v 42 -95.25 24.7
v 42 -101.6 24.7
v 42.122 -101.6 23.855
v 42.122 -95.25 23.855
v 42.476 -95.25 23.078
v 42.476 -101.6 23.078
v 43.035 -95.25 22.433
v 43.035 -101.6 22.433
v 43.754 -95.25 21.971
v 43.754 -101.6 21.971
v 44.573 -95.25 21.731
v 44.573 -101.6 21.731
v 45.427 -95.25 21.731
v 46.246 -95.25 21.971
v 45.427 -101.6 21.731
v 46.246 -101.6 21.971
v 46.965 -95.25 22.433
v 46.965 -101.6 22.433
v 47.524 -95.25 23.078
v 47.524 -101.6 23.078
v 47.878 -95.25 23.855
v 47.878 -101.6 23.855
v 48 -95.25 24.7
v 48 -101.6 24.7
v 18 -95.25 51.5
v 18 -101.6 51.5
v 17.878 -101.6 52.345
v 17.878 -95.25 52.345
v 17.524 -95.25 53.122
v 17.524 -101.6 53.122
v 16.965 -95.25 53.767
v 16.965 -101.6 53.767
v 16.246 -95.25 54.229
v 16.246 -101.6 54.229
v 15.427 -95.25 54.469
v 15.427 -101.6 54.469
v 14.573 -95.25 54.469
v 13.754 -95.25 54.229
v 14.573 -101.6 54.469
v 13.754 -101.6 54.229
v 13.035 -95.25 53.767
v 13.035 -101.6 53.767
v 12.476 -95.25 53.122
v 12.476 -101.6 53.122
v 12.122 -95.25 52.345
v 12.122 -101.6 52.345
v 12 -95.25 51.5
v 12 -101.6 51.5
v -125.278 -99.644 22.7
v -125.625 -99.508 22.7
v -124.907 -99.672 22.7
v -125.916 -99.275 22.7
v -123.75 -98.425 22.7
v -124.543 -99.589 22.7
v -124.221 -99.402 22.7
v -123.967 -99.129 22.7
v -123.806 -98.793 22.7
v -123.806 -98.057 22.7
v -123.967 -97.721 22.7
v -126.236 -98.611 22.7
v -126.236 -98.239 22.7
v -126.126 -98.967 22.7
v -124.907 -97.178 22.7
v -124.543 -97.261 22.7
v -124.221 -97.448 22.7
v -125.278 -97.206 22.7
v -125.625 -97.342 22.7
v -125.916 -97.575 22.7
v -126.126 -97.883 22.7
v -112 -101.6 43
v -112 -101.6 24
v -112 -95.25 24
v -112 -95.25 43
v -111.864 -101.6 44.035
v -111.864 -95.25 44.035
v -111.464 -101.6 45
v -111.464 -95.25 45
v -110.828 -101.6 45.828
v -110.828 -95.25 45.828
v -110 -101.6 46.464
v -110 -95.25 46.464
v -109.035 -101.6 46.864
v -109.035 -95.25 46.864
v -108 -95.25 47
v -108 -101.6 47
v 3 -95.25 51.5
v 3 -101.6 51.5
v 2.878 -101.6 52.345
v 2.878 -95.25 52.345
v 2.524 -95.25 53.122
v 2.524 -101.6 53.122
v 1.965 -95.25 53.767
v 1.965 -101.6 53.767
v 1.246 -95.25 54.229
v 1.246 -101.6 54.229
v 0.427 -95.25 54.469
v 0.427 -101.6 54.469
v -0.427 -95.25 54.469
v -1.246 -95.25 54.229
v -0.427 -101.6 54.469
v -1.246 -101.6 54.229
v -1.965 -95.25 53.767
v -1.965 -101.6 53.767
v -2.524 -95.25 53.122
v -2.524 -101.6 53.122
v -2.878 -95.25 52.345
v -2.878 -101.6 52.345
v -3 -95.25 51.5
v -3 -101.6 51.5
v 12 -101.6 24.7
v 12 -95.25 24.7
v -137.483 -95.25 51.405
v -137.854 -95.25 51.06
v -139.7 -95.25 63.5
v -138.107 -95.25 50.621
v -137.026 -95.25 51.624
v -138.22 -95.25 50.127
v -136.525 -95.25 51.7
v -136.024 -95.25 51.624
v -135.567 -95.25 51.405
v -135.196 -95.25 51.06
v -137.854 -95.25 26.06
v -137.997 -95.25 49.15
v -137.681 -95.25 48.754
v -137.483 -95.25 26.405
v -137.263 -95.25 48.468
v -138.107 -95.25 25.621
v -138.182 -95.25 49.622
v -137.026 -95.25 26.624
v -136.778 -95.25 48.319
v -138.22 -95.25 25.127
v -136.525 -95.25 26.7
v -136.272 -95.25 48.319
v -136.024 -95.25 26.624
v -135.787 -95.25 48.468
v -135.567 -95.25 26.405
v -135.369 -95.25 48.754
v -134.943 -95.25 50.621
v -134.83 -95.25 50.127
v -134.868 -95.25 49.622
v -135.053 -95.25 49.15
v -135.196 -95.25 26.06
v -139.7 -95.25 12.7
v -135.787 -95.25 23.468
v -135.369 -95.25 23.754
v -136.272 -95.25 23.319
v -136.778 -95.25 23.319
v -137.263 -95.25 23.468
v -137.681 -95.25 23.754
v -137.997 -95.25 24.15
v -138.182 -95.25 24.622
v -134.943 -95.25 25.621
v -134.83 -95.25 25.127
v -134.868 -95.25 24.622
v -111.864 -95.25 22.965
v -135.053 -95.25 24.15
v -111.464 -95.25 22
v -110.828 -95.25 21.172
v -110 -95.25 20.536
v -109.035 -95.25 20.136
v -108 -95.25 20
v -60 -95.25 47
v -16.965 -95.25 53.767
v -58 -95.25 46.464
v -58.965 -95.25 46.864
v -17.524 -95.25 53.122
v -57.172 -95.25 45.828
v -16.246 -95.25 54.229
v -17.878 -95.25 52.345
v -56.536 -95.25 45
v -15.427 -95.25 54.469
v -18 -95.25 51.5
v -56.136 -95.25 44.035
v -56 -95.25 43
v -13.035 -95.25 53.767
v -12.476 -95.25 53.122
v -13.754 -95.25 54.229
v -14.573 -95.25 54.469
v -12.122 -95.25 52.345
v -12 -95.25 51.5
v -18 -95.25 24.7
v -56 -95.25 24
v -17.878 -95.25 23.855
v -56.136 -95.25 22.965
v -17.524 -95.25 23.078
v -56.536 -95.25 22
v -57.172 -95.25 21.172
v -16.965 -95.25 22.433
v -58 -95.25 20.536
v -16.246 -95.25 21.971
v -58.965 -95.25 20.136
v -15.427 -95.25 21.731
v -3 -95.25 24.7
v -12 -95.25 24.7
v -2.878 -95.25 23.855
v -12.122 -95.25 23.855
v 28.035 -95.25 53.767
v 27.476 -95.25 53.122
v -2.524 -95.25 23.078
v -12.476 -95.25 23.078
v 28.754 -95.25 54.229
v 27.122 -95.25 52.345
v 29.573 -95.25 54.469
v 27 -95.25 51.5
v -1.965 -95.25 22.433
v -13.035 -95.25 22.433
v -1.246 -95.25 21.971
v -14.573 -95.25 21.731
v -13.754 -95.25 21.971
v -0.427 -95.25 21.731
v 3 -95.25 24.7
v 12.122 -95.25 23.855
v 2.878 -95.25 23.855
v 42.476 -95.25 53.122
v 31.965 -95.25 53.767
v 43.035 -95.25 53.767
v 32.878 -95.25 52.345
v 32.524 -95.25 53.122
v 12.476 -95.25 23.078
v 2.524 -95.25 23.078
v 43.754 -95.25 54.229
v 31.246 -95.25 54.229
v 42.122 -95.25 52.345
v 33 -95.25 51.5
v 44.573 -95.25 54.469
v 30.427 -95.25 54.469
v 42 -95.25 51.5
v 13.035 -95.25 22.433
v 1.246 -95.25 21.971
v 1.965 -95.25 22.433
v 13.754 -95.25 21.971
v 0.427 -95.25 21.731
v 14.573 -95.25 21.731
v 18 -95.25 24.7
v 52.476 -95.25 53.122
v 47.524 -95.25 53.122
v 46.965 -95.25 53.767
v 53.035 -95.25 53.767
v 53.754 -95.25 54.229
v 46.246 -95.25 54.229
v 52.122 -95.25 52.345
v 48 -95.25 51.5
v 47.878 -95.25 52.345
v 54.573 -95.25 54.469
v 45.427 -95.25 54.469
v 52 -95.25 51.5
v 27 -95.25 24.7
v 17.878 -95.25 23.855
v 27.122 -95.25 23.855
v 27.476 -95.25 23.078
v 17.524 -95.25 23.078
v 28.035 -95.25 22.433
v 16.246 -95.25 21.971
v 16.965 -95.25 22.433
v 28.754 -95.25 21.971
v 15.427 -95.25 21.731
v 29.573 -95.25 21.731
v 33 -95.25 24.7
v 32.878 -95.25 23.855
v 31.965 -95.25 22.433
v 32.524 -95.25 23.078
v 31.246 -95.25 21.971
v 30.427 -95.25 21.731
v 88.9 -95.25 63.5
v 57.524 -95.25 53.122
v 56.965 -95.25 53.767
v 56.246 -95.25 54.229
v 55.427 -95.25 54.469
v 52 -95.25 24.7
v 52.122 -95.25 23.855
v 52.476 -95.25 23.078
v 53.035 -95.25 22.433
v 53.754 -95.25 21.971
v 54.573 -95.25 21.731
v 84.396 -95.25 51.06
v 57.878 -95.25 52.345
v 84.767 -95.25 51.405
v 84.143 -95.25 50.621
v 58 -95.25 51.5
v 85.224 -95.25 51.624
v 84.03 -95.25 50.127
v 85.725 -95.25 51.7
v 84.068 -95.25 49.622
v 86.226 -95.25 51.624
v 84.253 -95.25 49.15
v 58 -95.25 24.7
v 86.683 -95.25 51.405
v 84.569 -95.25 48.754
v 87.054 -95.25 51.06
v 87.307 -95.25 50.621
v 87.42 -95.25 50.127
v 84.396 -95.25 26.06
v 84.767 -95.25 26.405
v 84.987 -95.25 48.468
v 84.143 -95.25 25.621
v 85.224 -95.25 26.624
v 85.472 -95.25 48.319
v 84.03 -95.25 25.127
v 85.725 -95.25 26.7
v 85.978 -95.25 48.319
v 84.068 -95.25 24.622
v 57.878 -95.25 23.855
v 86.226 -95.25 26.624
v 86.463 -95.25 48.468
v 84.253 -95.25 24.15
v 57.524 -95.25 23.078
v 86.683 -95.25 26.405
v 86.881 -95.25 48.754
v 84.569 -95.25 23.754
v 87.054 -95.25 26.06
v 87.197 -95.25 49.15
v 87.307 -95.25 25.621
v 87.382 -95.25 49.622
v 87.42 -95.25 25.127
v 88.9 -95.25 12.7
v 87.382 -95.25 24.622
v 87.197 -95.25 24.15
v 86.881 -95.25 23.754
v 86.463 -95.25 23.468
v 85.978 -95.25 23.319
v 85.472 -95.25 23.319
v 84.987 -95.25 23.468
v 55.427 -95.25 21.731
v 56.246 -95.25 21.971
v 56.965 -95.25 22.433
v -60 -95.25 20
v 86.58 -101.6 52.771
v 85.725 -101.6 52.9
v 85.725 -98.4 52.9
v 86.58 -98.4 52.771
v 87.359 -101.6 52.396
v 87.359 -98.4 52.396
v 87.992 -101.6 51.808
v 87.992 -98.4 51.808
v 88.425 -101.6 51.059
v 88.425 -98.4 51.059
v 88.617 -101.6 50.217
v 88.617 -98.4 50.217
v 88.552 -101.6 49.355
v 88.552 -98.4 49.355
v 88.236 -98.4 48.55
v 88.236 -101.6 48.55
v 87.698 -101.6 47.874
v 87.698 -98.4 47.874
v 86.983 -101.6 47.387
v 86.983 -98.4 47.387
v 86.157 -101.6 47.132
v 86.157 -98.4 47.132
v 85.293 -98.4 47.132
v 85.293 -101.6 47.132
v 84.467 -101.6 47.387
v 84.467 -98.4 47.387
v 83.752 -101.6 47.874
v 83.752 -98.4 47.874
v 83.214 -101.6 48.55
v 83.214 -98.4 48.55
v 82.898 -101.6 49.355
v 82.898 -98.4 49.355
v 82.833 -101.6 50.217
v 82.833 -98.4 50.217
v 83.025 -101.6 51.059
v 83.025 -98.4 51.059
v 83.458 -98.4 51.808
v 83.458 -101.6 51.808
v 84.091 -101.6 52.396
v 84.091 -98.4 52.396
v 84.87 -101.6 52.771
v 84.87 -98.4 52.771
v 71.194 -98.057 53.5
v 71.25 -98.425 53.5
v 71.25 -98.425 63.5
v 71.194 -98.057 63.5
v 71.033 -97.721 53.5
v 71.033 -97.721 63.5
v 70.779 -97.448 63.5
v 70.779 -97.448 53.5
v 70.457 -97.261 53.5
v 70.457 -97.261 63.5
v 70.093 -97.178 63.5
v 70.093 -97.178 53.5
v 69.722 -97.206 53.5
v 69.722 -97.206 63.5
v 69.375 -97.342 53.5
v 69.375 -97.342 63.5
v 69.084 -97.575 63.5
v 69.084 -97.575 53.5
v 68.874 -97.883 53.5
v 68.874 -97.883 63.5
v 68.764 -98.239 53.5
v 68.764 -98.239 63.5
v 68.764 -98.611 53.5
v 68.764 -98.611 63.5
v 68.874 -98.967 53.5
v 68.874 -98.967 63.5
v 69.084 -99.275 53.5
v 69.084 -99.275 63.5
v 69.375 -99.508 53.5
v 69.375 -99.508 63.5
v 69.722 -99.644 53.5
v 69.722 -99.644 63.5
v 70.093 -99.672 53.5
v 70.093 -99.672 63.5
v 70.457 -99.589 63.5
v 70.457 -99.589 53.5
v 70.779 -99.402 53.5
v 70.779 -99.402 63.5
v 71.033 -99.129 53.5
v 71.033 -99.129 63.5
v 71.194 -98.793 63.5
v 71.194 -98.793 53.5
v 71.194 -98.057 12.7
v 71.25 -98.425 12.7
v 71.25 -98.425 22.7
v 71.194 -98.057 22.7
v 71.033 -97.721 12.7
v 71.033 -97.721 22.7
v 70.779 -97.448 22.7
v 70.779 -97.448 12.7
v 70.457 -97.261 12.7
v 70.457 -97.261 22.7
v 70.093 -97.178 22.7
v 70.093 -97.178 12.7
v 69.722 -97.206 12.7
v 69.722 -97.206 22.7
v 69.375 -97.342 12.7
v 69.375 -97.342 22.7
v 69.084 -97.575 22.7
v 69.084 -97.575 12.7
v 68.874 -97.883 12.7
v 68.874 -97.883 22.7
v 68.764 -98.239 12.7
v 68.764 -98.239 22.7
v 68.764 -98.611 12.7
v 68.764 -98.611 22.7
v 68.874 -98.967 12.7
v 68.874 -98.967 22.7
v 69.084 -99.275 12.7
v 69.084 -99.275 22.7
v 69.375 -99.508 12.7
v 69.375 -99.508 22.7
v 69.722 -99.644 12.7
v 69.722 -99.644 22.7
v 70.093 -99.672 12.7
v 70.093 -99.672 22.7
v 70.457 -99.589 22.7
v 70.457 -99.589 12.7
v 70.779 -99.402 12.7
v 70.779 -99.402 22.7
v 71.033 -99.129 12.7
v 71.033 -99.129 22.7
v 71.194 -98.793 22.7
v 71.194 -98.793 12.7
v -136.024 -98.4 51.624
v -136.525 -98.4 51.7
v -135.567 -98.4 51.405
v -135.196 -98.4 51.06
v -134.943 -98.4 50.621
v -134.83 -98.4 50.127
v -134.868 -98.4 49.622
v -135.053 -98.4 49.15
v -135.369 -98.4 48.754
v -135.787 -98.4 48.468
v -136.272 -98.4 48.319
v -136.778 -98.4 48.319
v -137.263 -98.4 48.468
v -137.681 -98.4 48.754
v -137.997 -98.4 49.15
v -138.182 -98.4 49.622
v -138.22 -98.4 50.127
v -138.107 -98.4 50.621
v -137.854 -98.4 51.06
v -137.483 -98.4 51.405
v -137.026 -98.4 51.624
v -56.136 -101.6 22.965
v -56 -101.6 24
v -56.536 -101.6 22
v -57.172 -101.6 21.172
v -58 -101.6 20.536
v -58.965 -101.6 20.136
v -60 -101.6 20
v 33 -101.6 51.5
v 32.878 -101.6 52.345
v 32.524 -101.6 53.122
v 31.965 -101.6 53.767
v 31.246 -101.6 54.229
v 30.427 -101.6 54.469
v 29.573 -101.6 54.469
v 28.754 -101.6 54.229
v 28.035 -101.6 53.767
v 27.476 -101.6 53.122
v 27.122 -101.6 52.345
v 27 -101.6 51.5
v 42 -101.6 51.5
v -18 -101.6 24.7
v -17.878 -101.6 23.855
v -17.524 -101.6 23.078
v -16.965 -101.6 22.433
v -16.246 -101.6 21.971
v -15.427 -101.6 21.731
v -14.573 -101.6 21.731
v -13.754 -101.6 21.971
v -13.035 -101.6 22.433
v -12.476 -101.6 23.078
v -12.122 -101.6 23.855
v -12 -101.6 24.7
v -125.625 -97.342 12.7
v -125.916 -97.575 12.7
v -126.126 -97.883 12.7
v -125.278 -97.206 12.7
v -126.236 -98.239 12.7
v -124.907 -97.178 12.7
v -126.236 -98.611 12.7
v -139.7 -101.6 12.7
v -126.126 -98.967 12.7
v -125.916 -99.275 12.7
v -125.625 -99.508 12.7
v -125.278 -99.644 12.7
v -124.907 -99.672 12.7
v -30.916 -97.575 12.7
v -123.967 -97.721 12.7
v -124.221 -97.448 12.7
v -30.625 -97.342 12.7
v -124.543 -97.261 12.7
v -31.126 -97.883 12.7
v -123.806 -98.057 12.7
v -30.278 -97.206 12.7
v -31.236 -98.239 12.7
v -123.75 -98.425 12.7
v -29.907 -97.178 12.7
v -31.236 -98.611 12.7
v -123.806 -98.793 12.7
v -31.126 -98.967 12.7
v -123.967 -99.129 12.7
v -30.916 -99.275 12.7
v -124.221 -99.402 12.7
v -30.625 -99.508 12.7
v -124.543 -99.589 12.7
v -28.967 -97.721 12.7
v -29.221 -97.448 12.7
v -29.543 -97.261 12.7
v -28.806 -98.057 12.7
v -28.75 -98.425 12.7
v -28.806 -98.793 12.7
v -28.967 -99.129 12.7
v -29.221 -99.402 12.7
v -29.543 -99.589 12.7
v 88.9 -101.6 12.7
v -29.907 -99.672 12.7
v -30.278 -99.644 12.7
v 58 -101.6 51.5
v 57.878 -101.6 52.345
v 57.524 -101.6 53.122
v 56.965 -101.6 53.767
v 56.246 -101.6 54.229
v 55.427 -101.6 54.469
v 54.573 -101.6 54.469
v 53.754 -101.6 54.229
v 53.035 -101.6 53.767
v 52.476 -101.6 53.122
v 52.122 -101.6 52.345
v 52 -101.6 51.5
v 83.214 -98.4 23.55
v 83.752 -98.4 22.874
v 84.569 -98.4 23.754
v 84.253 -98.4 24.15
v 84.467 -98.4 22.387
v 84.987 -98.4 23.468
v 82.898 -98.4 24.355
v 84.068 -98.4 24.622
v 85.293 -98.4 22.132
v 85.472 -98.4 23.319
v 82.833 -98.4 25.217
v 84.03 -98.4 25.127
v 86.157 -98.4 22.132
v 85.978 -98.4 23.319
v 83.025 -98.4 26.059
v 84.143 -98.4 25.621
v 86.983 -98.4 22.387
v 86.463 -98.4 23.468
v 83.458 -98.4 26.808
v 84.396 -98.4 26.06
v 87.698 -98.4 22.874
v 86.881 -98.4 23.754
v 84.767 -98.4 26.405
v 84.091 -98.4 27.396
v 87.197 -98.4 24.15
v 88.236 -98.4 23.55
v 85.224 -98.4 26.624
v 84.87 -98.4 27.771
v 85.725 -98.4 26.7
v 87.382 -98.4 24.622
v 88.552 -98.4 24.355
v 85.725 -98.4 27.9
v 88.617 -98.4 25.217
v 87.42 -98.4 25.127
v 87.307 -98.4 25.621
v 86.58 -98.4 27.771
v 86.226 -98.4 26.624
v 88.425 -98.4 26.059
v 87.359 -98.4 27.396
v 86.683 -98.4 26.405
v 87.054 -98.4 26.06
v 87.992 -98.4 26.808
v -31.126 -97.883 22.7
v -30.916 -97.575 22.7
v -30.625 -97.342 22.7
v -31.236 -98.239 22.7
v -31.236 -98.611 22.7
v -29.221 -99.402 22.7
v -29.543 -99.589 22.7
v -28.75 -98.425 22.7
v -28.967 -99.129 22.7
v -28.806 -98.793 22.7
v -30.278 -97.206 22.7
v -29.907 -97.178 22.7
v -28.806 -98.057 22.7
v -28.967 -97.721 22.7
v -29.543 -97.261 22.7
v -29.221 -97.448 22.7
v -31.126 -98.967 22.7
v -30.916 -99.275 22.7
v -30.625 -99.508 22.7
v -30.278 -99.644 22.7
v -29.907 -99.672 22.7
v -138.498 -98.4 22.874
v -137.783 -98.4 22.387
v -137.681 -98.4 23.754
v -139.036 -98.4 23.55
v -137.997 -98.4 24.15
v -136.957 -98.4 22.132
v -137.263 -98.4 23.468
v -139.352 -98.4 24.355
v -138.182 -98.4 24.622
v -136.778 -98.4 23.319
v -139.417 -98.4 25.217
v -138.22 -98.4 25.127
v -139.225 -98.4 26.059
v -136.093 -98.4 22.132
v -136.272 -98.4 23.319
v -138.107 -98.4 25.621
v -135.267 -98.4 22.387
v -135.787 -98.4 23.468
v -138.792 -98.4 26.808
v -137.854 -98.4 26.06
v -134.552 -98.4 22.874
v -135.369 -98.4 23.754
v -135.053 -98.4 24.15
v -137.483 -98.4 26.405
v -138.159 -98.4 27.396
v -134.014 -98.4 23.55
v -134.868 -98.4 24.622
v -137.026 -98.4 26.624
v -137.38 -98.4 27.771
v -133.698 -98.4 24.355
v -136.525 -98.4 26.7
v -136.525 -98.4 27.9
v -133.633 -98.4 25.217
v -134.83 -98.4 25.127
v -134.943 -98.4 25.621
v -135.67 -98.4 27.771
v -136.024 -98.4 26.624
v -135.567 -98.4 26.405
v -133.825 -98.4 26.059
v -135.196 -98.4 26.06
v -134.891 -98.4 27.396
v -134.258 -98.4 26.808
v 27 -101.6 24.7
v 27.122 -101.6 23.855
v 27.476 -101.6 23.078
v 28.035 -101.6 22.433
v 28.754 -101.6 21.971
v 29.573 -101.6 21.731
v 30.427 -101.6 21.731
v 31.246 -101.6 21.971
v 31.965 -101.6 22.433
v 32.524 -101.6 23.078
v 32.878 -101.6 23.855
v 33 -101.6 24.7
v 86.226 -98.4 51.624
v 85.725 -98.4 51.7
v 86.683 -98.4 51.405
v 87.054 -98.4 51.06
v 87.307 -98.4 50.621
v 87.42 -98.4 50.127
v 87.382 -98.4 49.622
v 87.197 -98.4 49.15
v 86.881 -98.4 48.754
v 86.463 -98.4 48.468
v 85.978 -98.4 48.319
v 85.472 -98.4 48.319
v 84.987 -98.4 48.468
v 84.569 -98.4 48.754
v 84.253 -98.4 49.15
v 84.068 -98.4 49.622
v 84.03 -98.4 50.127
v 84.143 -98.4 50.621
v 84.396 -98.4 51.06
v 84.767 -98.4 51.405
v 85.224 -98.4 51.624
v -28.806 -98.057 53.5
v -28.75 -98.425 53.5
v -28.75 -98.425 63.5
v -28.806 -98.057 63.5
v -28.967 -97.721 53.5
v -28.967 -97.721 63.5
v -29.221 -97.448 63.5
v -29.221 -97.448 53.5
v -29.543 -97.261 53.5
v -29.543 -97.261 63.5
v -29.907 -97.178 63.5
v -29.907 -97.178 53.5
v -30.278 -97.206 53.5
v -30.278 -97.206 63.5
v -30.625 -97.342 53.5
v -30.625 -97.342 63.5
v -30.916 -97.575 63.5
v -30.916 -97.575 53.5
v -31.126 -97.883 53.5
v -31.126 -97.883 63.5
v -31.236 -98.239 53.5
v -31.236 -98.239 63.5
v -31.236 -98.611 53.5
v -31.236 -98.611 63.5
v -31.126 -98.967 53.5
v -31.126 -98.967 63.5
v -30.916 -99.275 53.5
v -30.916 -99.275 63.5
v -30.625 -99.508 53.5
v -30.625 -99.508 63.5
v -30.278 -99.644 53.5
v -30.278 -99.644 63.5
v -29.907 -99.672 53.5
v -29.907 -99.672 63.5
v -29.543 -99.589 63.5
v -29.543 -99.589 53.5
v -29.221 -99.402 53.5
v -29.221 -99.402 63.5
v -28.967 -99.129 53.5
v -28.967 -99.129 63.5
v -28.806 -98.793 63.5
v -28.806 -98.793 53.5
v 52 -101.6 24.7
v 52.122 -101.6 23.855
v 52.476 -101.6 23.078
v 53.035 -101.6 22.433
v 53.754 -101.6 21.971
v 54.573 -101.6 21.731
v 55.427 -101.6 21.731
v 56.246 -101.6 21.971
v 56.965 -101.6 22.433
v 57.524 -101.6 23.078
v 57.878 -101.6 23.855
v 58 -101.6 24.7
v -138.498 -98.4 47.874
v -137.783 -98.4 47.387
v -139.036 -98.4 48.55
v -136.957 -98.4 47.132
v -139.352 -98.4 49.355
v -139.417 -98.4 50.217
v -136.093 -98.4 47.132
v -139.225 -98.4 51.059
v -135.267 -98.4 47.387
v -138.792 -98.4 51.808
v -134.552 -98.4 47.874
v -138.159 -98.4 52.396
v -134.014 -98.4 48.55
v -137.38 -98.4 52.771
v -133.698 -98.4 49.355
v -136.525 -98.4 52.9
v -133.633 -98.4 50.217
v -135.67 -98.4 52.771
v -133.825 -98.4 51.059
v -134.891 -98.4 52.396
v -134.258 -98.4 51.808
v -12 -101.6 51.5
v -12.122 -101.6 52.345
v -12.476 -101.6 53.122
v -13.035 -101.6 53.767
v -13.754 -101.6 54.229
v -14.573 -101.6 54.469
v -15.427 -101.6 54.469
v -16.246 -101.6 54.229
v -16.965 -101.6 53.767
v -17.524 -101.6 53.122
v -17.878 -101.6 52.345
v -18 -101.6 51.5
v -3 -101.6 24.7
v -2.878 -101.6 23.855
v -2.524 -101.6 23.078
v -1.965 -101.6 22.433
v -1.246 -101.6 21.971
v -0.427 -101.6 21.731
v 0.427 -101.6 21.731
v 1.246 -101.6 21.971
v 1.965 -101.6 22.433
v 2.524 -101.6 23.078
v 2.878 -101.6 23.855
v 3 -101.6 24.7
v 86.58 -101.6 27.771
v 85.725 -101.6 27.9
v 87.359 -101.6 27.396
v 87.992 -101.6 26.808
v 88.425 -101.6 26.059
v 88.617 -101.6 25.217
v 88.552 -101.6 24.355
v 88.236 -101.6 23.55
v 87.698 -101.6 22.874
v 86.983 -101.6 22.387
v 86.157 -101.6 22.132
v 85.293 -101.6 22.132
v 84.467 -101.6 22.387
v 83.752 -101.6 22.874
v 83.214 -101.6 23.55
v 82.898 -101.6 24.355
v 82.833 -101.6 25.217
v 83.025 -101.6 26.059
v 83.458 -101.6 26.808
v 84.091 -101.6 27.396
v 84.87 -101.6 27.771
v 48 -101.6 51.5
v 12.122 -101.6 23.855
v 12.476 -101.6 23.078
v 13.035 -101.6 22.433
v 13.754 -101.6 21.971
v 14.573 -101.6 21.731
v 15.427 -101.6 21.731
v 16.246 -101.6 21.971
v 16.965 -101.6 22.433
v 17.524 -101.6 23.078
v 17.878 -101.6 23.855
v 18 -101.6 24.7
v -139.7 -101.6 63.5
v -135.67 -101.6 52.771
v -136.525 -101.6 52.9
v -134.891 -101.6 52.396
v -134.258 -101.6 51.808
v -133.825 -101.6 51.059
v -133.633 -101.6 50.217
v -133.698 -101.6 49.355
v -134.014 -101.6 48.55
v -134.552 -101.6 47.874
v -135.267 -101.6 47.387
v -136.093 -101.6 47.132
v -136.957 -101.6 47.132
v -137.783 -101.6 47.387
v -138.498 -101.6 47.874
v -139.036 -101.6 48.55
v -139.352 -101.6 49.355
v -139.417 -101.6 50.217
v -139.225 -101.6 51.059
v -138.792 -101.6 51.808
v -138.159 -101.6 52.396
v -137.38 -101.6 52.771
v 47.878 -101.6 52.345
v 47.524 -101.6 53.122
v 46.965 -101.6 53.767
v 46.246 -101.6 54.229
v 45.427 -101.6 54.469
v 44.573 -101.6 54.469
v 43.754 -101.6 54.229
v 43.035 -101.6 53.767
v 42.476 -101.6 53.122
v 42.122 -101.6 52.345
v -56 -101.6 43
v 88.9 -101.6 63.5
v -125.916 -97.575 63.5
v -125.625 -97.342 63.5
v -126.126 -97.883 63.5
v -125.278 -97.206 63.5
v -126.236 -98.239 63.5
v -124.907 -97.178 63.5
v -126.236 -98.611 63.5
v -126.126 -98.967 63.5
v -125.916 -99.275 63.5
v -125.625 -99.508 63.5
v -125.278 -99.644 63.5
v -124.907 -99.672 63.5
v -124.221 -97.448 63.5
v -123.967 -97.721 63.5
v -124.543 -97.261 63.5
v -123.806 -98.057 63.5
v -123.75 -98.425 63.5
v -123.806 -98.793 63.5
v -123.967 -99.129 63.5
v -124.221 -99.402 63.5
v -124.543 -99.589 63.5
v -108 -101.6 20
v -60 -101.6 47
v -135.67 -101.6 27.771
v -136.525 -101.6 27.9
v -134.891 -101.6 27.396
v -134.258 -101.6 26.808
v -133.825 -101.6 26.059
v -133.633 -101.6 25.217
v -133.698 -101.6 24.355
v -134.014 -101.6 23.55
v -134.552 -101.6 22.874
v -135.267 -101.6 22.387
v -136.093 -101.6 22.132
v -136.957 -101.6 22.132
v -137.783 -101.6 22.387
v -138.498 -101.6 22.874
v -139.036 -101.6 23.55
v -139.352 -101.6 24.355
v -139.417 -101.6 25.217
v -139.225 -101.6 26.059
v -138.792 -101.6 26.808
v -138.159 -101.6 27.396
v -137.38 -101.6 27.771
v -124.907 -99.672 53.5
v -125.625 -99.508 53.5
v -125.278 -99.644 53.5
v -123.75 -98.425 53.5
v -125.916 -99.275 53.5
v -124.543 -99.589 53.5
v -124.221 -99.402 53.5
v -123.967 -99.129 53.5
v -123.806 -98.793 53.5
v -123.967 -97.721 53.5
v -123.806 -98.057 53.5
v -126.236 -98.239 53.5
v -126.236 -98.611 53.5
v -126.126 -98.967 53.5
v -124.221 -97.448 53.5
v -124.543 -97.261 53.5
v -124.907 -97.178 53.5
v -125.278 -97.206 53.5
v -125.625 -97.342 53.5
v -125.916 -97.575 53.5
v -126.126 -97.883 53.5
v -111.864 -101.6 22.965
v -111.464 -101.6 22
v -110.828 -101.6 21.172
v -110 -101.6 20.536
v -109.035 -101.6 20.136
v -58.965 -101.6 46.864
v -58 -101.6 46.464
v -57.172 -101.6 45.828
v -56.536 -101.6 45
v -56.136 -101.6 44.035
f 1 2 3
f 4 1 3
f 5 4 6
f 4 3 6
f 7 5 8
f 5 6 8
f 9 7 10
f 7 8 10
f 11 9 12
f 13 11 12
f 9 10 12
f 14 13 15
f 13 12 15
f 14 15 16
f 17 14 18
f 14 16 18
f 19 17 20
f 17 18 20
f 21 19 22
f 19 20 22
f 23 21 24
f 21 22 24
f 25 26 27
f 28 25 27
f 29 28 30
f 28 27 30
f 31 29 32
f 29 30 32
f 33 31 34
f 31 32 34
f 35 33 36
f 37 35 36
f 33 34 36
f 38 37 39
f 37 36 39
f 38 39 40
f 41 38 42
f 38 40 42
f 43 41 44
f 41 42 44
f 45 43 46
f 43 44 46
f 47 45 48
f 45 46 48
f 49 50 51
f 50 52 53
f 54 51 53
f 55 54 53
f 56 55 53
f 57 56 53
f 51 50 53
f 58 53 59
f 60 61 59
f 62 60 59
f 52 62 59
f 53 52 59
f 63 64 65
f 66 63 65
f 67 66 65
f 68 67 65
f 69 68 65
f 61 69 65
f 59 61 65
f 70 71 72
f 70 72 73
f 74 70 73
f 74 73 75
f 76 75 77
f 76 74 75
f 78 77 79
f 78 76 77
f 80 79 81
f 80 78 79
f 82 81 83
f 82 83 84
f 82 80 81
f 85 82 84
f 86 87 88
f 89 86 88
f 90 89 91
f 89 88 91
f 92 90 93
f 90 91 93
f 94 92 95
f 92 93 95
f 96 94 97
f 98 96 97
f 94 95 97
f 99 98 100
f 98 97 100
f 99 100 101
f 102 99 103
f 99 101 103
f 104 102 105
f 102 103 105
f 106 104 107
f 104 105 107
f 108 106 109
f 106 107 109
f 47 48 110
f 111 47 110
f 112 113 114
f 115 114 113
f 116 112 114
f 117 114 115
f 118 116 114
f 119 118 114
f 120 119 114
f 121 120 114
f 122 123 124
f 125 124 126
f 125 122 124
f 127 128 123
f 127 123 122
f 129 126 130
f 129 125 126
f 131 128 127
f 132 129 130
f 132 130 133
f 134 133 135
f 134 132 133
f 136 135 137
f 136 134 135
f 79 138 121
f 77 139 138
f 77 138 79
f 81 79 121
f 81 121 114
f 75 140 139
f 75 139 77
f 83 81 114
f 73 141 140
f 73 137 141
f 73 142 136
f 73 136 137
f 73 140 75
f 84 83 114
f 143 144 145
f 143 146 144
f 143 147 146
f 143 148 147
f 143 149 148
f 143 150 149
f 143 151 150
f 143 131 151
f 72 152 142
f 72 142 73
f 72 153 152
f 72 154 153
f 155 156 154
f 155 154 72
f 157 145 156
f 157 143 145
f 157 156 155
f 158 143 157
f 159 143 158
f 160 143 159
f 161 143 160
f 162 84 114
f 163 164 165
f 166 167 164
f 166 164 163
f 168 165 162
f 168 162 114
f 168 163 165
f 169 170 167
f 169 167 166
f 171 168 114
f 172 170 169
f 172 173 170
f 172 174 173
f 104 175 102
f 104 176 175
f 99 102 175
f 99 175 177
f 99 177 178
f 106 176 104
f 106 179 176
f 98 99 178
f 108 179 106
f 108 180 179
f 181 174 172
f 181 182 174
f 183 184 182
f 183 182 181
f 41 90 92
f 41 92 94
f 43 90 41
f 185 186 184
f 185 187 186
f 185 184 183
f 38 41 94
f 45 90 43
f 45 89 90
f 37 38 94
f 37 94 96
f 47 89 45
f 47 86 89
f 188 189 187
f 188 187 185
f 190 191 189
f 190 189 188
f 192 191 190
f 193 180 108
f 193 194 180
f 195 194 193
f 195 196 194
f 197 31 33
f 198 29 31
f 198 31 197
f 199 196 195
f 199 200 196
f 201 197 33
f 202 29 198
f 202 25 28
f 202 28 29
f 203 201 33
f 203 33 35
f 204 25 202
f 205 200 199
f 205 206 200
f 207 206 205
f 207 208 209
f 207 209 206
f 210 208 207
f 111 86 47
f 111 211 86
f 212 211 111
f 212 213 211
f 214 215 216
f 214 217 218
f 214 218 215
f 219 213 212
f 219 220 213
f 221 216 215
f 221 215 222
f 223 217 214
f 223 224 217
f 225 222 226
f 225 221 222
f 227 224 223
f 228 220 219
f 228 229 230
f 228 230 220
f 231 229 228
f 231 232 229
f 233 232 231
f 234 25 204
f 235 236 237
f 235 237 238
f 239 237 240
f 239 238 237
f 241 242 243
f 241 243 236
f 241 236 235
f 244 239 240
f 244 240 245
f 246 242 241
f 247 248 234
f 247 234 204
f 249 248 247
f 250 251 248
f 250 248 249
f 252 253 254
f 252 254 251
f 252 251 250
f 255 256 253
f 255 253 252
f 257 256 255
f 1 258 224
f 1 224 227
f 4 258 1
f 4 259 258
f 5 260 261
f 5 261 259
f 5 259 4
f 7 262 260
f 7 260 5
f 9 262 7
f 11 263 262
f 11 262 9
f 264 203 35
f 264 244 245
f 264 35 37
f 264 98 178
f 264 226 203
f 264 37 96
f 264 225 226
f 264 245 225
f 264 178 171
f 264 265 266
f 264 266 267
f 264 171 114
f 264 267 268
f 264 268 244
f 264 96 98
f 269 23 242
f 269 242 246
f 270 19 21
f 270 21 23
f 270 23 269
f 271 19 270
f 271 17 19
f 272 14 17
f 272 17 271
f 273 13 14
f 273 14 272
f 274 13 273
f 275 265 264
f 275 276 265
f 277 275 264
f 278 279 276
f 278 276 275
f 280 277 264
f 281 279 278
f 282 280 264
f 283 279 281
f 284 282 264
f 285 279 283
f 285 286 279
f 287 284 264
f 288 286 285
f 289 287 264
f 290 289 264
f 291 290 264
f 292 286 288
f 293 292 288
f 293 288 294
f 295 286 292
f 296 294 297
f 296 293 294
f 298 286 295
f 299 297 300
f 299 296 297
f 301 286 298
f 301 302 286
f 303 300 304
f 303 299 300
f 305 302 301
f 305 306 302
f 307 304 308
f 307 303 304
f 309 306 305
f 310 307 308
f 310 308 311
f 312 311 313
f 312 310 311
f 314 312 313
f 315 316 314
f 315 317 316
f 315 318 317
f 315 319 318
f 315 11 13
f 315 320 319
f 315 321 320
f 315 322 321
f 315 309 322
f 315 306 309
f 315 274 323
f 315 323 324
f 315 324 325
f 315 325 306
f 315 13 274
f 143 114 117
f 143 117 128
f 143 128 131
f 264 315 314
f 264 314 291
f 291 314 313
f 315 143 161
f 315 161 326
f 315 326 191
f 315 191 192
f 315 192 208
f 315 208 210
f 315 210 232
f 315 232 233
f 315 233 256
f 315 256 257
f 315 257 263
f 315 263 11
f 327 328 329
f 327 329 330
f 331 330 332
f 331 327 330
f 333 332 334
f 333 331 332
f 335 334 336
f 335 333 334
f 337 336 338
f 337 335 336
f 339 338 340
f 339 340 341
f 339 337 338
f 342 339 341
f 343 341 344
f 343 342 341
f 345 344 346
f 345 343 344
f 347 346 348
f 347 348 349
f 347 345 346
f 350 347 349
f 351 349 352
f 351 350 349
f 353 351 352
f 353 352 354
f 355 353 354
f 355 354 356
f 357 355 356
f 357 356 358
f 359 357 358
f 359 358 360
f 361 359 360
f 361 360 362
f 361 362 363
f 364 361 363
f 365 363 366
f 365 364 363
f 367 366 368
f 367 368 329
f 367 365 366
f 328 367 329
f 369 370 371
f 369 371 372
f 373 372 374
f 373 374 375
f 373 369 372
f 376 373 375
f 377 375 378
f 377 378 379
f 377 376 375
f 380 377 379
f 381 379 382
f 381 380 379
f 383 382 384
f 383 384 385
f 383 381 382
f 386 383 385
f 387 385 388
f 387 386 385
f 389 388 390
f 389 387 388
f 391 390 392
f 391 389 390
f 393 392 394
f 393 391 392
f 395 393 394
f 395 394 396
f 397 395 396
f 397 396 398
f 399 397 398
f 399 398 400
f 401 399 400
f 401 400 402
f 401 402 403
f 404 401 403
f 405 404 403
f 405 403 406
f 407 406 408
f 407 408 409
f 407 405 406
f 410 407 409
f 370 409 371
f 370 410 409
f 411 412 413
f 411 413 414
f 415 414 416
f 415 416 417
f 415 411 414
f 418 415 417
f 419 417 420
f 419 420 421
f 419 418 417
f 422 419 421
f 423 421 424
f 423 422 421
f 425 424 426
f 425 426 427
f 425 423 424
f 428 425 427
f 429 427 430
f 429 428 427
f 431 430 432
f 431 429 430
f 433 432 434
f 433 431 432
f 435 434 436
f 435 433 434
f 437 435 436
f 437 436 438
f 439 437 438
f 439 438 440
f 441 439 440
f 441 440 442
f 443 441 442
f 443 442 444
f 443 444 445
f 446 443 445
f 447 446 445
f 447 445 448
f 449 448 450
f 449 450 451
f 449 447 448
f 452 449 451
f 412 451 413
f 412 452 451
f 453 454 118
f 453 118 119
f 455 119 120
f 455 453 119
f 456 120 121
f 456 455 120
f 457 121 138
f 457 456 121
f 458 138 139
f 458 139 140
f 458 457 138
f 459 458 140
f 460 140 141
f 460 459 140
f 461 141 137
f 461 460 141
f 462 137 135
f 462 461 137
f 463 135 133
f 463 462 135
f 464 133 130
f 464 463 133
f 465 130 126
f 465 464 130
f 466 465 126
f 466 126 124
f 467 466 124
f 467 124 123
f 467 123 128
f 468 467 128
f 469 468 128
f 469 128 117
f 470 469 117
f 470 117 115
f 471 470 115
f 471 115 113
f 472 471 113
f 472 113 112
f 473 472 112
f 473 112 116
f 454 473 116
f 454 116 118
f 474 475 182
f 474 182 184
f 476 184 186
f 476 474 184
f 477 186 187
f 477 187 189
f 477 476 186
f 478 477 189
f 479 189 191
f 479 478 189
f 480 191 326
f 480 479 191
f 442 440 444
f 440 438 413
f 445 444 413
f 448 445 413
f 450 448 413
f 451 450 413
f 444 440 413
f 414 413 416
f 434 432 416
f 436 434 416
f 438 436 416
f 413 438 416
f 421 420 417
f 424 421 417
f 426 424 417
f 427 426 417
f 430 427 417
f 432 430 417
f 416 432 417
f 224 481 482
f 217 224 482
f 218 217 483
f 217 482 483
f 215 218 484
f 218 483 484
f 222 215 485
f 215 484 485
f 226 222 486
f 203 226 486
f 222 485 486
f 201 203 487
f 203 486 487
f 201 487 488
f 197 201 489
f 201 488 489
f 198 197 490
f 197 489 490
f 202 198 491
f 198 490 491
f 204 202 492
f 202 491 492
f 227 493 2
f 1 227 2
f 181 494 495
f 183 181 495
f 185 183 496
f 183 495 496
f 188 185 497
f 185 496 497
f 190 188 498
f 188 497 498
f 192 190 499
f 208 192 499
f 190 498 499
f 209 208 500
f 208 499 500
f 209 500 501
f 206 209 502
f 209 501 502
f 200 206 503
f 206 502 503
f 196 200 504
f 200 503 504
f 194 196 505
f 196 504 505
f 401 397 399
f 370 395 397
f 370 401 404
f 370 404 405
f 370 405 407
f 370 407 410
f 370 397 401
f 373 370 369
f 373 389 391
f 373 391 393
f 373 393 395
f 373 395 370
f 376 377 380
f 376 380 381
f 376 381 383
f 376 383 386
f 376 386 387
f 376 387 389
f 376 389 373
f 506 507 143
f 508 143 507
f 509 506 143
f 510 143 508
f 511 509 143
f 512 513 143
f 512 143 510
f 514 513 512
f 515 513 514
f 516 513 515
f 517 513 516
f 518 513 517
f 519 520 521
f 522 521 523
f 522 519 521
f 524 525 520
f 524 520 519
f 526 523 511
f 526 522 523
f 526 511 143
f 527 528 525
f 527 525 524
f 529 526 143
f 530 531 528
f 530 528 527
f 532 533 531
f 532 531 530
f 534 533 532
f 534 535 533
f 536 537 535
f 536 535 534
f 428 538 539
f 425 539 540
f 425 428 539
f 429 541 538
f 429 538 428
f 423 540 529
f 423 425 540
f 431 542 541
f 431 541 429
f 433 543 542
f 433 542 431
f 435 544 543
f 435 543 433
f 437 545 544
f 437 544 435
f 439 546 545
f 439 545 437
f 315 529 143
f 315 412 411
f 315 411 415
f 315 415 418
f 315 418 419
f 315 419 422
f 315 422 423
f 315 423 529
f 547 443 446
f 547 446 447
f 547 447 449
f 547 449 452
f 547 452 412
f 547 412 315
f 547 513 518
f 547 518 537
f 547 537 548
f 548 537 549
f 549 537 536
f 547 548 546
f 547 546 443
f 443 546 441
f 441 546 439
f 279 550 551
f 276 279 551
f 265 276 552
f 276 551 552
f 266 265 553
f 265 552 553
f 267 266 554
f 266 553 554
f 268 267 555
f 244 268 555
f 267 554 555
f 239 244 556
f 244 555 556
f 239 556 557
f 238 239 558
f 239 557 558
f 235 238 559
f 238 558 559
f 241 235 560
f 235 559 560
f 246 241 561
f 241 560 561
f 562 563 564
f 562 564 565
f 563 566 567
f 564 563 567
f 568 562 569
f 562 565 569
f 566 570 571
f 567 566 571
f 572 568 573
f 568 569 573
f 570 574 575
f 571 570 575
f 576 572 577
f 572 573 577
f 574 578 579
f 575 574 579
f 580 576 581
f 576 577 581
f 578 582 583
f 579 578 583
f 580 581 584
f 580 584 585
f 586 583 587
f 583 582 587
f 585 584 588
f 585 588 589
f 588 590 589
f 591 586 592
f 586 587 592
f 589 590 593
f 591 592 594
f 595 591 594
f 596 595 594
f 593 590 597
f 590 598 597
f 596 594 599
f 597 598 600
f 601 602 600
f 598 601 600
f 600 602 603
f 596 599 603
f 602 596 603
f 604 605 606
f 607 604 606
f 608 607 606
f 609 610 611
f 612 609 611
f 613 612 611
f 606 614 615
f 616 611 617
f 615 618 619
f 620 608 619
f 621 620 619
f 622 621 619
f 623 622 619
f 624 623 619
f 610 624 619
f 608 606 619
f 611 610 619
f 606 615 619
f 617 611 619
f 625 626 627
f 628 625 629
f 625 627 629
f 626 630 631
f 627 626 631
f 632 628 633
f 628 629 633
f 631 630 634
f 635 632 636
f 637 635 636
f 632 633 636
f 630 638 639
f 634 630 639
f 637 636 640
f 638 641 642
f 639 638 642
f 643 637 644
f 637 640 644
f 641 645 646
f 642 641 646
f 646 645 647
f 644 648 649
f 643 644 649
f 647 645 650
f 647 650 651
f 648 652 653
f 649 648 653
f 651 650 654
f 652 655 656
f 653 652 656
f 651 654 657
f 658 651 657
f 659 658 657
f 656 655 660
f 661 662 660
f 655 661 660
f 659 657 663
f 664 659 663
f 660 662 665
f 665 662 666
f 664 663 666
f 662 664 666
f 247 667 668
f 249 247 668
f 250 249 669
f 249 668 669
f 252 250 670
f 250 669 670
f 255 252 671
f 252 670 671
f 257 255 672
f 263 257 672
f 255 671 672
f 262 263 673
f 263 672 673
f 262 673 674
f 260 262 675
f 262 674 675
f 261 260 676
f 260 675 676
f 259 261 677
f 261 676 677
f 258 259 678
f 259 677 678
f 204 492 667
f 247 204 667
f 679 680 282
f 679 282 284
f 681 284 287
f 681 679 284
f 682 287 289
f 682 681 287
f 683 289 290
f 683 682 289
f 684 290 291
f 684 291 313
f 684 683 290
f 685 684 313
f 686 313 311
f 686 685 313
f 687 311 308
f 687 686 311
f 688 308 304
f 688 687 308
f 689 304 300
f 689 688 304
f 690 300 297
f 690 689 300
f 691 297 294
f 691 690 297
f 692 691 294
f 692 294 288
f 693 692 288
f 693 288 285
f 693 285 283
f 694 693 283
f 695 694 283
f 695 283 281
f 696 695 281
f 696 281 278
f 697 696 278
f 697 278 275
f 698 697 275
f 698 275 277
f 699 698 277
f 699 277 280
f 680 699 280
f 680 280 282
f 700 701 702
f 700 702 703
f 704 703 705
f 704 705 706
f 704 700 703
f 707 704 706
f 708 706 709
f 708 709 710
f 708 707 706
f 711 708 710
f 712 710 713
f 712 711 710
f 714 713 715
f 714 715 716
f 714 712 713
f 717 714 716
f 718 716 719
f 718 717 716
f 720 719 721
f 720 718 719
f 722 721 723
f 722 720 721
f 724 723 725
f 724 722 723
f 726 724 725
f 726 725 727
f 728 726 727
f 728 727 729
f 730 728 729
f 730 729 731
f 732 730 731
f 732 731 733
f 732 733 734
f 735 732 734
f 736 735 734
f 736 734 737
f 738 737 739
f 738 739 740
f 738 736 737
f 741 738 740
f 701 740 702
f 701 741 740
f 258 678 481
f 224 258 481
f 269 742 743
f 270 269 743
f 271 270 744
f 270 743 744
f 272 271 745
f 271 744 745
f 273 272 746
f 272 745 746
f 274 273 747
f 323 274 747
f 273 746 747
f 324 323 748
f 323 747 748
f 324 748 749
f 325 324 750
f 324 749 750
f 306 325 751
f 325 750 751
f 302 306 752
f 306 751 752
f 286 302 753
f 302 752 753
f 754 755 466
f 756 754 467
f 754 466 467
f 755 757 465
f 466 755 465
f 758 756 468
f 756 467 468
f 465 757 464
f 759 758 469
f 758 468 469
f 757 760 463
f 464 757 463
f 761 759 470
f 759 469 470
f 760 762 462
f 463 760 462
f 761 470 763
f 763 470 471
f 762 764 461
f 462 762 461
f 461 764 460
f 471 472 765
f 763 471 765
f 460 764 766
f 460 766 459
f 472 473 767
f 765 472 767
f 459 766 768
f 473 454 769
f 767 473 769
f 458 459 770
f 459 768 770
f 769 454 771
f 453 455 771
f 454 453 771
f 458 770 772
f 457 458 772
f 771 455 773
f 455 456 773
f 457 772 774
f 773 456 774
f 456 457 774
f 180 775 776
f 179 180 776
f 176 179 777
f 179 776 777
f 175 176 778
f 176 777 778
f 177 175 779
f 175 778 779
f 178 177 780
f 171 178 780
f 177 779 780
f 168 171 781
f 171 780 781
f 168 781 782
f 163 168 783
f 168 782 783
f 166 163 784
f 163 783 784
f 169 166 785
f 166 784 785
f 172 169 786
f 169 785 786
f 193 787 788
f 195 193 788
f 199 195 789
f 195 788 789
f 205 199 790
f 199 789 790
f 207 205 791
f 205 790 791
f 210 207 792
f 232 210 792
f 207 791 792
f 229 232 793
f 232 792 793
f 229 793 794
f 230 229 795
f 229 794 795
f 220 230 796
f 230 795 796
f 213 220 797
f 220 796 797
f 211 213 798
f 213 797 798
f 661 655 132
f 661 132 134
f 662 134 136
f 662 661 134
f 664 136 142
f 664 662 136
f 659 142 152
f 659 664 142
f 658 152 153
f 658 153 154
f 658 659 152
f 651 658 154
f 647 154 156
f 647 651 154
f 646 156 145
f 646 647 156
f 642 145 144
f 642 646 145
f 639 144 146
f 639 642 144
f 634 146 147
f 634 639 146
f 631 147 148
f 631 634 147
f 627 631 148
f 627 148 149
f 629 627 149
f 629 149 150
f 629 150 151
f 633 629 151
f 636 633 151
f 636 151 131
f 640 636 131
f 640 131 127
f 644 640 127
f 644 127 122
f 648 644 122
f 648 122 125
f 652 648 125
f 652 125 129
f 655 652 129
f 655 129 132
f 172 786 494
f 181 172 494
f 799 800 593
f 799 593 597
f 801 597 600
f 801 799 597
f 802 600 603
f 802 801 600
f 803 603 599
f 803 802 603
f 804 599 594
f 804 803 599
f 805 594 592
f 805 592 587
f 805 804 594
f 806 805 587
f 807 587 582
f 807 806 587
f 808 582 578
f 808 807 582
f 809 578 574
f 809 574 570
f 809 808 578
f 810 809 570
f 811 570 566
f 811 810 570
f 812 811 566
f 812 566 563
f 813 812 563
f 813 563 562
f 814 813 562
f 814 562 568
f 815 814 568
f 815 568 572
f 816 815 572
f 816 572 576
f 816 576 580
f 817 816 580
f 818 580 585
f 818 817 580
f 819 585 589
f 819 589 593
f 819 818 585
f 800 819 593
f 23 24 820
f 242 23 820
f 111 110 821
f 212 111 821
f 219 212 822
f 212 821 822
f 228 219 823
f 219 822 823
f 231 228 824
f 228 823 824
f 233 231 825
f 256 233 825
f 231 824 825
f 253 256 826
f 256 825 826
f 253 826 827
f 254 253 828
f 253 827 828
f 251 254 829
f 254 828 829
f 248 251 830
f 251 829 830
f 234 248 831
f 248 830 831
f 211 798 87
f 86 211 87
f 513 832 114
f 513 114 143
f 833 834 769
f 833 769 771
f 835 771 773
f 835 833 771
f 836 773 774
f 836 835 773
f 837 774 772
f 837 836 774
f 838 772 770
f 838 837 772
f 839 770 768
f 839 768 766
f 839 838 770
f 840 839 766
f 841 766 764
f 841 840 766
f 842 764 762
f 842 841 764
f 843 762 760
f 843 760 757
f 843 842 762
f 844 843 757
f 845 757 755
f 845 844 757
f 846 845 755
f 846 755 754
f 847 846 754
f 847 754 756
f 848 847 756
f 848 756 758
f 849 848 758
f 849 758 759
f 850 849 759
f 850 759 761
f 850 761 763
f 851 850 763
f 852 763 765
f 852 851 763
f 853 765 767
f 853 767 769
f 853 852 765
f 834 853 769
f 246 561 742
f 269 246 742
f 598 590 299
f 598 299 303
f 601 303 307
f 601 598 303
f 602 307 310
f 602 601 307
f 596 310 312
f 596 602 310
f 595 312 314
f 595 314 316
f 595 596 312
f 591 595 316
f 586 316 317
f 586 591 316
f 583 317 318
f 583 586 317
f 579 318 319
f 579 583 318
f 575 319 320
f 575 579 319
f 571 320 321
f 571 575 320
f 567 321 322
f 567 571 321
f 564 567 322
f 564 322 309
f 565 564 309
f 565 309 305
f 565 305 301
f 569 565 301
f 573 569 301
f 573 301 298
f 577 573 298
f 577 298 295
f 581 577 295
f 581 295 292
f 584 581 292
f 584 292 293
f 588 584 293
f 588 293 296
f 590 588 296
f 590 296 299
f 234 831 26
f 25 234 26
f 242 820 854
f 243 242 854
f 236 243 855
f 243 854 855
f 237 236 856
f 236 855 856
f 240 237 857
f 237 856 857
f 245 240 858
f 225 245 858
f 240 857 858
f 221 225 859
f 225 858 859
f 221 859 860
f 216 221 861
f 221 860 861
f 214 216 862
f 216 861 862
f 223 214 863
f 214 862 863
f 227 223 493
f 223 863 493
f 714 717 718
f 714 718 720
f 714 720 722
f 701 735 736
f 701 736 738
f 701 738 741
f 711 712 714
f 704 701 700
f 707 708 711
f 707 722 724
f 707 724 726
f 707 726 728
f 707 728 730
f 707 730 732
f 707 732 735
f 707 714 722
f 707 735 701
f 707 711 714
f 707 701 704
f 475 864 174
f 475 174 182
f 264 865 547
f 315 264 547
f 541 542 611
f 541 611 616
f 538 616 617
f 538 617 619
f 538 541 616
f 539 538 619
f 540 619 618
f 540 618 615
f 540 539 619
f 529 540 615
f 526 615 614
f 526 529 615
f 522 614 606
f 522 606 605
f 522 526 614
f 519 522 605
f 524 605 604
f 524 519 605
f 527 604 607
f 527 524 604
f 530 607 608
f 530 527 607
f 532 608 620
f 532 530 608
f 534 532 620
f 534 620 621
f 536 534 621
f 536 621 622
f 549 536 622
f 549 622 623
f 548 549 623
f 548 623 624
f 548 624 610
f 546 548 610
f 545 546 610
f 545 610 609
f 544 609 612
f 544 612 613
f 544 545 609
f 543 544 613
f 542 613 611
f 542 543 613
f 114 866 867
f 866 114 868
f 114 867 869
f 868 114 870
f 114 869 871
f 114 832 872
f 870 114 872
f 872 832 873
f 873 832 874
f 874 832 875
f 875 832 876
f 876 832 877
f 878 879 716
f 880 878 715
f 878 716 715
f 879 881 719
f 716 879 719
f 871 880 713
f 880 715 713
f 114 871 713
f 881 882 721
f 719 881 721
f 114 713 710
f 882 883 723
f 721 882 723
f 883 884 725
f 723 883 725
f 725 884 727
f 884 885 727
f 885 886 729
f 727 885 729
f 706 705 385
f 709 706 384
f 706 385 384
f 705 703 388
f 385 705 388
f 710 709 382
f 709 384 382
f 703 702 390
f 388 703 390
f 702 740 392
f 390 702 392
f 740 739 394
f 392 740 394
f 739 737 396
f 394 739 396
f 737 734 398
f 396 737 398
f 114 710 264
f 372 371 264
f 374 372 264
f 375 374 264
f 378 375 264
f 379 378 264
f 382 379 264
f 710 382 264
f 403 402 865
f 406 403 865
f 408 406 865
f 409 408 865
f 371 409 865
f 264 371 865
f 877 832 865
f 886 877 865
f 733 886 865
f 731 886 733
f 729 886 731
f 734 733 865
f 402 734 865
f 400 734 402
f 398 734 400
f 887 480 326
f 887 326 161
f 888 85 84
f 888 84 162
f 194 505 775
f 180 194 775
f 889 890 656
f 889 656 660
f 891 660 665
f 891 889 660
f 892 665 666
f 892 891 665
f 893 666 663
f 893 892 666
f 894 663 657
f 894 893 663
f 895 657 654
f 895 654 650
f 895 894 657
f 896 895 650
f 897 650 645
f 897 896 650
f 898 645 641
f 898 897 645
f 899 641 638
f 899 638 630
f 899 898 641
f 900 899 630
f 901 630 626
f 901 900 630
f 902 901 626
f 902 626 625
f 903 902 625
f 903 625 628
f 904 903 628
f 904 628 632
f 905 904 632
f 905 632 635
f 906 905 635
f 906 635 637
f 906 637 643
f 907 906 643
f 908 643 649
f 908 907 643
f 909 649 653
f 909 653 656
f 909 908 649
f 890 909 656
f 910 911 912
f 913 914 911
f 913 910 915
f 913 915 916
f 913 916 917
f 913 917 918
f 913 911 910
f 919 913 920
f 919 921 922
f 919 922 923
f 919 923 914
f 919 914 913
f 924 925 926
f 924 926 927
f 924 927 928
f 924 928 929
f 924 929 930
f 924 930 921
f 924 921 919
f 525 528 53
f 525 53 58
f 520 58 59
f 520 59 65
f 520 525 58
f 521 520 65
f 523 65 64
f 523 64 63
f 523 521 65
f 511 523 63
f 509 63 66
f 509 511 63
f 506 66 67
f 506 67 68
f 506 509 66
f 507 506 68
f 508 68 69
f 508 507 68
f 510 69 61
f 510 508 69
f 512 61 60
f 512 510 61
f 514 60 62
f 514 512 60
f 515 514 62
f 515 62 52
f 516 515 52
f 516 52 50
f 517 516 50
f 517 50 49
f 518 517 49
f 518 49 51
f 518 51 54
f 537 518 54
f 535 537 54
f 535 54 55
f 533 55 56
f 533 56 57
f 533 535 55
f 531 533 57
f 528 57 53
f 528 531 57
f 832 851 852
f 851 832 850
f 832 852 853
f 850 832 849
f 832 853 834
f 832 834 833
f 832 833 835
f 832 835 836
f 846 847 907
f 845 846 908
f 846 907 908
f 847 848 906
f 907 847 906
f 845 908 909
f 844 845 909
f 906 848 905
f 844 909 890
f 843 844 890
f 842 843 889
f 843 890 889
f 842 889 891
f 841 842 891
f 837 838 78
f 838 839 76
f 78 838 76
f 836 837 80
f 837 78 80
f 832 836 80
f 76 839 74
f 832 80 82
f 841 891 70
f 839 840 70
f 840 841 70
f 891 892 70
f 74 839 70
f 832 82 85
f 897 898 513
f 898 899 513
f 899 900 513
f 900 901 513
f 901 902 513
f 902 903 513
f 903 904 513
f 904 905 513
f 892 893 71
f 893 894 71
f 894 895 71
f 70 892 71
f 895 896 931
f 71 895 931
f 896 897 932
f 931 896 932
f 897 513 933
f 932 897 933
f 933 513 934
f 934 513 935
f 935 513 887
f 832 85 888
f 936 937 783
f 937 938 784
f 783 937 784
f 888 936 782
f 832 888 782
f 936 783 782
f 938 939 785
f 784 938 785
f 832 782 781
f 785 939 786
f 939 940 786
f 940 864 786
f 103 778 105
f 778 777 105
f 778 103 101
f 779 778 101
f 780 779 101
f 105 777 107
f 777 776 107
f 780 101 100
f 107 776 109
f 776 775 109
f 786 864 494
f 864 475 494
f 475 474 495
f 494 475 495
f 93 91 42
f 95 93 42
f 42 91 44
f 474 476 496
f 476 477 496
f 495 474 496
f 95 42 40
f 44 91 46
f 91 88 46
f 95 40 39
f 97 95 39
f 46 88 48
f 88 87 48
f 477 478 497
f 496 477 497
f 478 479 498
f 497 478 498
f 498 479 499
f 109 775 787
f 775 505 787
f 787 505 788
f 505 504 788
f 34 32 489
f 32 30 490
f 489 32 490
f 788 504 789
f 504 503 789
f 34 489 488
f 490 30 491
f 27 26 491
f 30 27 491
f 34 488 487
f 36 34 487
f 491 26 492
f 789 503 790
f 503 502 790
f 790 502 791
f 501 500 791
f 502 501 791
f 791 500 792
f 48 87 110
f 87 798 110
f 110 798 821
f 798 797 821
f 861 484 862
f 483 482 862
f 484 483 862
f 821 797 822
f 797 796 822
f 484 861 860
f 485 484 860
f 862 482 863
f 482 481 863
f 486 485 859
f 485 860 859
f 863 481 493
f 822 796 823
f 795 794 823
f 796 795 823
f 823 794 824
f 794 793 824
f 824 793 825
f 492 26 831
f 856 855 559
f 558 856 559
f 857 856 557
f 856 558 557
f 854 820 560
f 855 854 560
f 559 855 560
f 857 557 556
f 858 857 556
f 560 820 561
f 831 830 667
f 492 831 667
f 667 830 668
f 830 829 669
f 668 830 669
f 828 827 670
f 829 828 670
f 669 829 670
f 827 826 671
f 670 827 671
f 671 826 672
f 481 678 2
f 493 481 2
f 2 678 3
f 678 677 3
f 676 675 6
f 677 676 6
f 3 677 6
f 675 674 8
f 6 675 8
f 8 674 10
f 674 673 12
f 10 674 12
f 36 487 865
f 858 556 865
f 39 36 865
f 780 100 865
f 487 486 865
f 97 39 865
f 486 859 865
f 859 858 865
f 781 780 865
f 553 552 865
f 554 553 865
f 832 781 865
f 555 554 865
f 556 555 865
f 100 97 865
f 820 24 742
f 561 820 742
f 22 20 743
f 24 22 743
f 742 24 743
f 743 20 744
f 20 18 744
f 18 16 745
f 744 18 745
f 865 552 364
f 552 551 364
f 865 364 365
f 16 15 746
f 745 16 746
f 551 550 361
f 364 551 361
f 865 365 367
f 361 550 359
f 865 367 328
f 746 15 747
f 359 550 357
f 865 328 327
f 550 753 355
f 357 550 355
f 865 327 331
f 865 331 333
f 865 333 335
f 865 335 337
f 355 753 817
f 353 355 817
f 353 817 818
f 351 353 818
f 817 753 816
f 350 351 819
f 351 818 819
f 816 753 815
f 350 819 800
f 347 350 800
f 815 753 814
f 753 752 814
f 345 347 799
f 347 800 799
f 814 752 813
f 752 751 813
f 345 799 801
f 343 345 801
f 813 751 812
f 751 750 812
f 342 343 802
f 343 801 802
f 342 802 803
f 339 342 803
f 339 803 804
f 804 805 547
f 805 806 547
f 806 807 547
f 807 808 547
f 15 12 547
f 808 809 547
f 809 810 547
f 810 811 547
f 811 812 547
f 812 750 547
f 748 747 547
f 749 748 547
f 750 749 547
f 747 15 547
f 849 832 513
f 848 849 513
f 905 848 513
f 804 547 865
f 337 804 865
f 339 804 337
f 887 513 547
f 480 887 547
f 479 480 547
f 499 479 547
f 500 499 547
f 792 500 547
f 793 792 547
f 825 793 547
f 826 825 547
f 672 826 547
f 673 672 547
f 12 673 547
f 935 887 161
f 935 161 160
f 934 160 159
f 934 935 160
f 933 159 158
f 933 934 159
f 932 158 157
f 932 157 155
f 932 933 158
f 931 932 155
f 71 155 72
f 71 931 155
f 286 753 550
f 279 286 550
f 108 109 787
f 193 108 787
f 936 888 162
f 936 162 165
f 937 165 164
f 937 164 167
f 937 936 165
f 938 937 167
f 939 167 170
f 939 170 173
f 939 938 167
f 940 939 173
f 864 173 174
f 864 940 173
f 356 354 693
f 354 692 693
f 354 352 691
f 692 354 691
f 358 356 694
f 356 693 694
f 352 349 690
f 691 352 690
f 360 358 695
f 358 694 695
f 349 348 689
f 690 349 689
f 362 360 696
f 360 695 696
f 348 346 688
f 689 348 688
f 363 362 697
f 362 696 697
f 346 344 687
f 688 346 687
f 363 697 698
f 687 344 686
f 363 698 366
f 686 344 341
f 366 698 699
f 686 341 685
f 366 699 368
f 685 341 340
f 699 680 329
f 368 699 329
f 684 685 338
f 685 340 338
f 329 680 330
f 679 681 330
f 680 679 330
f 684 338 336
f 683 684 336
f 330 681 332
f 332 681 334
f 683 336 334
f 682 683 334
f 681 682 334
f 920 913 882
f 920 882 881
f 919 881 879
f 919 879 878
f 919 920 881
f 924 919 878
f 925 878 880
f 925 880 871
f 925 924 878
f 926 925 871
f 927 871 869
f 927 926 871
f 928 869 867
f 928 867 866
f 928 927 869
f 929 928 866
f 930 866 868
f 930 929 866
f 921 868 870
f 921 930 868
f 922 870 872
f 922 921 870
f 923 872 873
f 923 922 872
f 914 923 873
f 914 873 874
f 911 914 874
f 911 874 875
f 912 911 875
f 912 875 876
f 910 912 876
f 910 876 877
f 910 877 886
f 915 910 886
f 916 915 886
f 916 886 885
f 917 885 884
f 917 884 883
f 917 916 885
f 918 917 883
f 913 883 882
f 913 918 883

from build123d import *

# Parameters (mm, degrees)
PARED_Y_1_4IN_START          = -101.6
CROQUIS1_W                   = 228.6
CROQUIS1_H                   = 50.8
PARED_Y_1_4IN_DEPTH          = 6.35
ROSCA_M3_INFERIOR_START      = 12.7
CROQUIS2_R                   = 1.25
ROSCA_M3_INFERIOR_DEPTH      = 10
ROSCA_M3_SUPERIOR_START      = 53.5
CROQUIS3_R                   = 1.25
ROSCA_M3_SUPERIOR_DEPTH      = 10
BARRENOS_M3_ESQUINAS_START   = -101.6
CROQUIS4_R                   = 1.7
BARRENOS_M3_ESQUINAS_DEPTH   = 6.35
REFRENTADO_M3_ESQUINAS_START = -101.6
CROQUIS5_R                   = 2.9
REFRENTADO_M3_ESQUINAS_DEPTH = 3.2
VENTANA_PUERTOS_RPI5_START   = -101.6
VENTANA_PUERTOS_RPI5_DEPTH   = 6.35
RANURAS_VENTILACION_START    = -101.6
RANURAS_VENTILACION_DEPTH    = 6.35


with BuildPart() as part:
    # Croquis1 → Pared_-Y_1-4in (new body)
    with BuildSketch(Plane(origin=(0, 0, 0), x_dir=(1, 0, 0), z_dir=(0, 1, 0)).offset(PARED_Y_1_4IN_START)):
        with Locations((-25.4, -38.1)):
            Rectangle(CROQUIS1_W, CROQUIS1_H)
    extrude(amount=PARED_Y_1_4IN_DEPTH)

    # Croquis2 → Rosca_M3_inferior (cut)
    with BuildSketch(Plane.XY.offset(ROSCA_M3_INFERIOR_START)):
        with Locations((-125, -98.425)):
            Circle(CROQUIS2_R)
        with Locations((-30, -98.425)):
            Circle(CROQUIS2_R)
        with Locations((70, -98.425)):
            Circle(CROQUIS2_R)
    extrude(amount=ROSCA_M3_INFERIOR_DEPTH, mode=Mode.SUBTRACT)

    # Croquis3 → Rosca_M3_superior (cut)
    with BuildSketch(Plane.XY.offset(ROSCA_M3_SUPERIOR_START)):
        with Locations((-125, -98.425)):
            Circle(CROQUIS3_R)
        with Locations((-30, -98.425)):
            Circle(CROQUIS3_R)
        with Locations((70, -98.425)):
            Circle(CROQUIS3_R)
    extrude(amount=ROSCA_M3_SUPERIOR_DEPTH, mode=Mode.SUBTRACT)

    # Croquis4 → Barrenos_M3_esquinas (cut)
    with BuildSketch(Plane(origin=(0, 0, 0), x_dir=(1, 0, 0), z_dir=(0, 1, 0)).offset(BARRENOS_M3_ESQUINAS_START)):
        with Locations(Location((-136.525, -25, 0), (0, 0, 270))):
            Circle(CROQUIS4_R)
        with Locations(Location((-136.525, -50, 0), (0, 0, 270))):
            Circle(CROQUIS4_R)
        with Locations(Location((85.725, -25, 0), (0, 0, 270))):
            Circle(CROQUIS4_R)
        with Locations(Location((85.725, -50, 0), (0, 0, 270))):
            Circle(CROQUIS4_R)
    extrude(amount=BARRENOS_M3_ESQUINAS_DEPTH, mode=Mode.SUBTRACT)

    # Croquis5 → Refrentado_M3_esquinas (cut)
    with BuildSketch(Plane(origin=(0, 0, 0), x_dir=(1, 0, 0), z_dir=(0, 1, 0)).offset(REFRENTADO_M3_ESQUINAS_START)):
        with Locations(Location((-136.525, -25, 0), (0, 0, 270))):
            Circle(CROQUIS5_R)
        with Locations(Location((-136.525, -50, 0), (0, 0, 270))):
            Circle(CROQUIS5_R)
        with Locations(Location((85.725, -25, 0), (0, 0, 270))):
            Circle(CROQUIS5_R)
        with Locations(Location((85.725, -50, 0), (0, 0, 270))):
            Circle(CROQUIS5_R)
    extrude(amount=REFRENTADO_M3_ESQUINAS_DEPTH, mode=Mode.SUBTRACT)

    # Croquis6 → Ventana_puertos_RPi5 (cut)
    with BuildSketch(Plane(origin=(0, 0, 0), x_dir=(1, 0, 0), z_dir=(0, 1, 0)).offset(VENTANA_PUERTOS_RPI5_START)):
        with BuildLine():
            Line((-108, -47), (-60, -47))
            ThreePointArc((-60, -47), (-57.171572875, -45.828427125), (-56, -43))
            Line((-56, -43), (-56, -24))
            ThreePointArc((-56, -24), (-57.171572875, -21.171572875), (-60, -20))
            Line((-60, -20), (-108, -20))
            ThreePointArc((-108, -20), (-110.828427125, -21.171572875), (-112, -24))
            Line((-112, -24), (-112, -43))
            ThreePointArc((-112, -43), (-110.828427125, -45.828427125), (-108, -47))
        make_face()
    extrude(amount=VENTANA_PUERTOS_RPI5_DEPTH, mode=Mode.SUBTRACT)

    # Croquis7 → Ranuras_ventilacion (cut)
    with BuildSketch(Plane(origin=(0, 0, 0), x_dir=(1, 0, 0), z_dir=(0, 1, 0)).offset(RANURAS_VENTILACION_START)):
        with BuildLine():
            Line((-12, -24.7), (-12, -51.5))
            ThreePointArc((-12, -51.5), (-15, -54.5), (-18, -51.5))
            Line((-18, -51.5), (-18, -24.7))
            ThreePointArc((-18, -24.7), (-15, -21.7), (-12, -24.7))
        make_face()
        with BuildLine():
            Line((3, -24.7), (3, -51.5))
            ThreePointArc((3, -51.5), (0, -54.5), (-3, -51.5))
            Line((-3, -51.5), (-3, -24.7))
            ThreePointArc((-3, -24.7), (0, -21.7), (3, -24.7))
        make_face()
        with BuildLine():
            Line((18, -24.7), (18, -51.5))
            ThreePointArc((18, -51.5), (15, -54.5), (12, -51.5))
            Line((12, -51.5), (12, -24.7))
            ThreePointArc((12, -24.7), (15, -21.7), (18, -24.7))
        make_face()
        with BuildLine():
            Line((33, -24.7), (33, -51.5))
            ThreePointArc((33, -51.5), (30, -54.5), (27, -51.5))
            Line((27, -51.5), (27, -24.7))
            ThreePointArc((27, -24.7), (30, -21.7), (33, -24.7))
        make_face()
        with BuildLine():
            Line((48, -24.7), (48, -51.5))
            ThreePointArc((48, -51.5), (45, -54.5), (42, -51.5))
            Line((42, -51.5), (42, -24.7))
            ThreePointArc((42, -24.7), (45, -21.7), (48, -24.7))
        make_face()
        with BuildLine():
            Line((58, -24.7), (58, -51.5))
            ThreePointArc((58, -51.5), (55, -54.5), (52, -51.5))
            Line((52, -51.5), (52, -24.7))
            ThreePointArc((52, -24.7), (55, -21.7), (58, -24.7))
        make_face()
    extrude(amount=RANURAS_VENTILACION_DEPTH, mode=Mode.SUBTRACT)


solid = part.part
